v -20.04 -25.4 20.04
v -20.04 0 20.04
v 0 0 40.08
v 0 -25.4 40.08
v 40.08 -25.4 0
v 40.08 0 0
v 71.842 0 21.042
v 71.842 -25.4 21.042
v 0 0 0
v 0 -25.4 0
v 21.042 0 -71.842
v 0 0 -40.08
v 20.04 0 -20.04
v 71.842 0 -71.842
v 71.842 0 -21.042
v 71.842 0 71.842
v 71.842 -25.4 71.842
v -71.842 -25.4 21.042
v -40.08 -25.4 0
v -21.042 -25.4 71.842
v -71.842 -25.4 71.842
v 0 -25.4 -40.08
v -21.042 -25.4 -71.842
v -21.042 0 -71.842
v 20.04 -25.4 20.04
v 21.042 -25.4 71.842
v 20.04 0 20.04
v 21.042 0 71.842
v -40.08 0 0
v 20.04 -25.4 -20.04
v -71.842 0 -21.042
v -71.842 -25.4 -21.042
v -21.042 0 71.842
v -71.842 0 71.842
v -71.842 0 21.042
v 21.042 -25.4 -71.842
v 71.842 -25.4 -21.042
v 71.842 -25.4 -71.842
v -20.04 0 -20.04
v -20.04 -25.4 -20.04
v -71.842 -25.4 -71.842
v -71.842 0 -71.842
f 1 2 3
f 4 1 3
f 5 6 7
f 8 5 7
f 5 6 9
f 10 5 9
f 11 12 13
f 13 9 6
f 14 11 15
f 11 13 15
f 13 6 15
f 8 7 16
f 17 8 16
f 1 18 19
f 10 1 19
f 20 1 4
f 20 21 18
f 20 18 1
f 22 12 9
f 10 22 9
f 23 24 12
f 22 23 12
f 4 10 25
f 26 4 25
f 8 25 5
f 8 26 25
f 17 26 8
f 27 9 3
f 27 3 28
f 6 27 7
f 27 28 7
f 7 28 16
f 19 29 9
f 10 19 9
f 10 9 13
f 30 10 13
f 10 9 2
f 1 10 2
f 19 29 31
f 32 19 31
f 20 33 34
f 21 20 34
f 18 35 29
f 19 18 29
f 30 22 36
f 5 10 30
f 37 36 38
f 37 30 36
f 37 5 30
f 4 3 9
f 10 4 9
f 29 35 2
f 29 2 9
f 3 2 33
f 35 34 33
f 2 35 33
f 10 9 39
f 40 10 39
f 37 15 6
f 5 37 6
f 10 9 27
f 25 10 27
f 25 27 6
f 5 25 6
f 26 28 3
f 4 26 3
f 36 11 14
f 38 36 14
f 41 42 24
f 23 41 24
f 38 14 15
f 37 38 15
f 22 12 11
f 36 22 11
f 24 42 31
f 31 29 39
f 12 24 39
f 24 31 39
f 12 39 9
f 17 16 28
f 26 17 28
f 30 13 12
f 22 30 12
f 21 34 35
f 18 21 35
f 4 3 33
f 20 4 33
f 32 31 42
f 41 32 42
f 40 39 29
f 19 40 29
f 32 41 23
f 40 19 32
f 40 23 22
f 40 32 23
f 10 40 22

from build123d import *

# Parameters (mm, degrees)
F2_DEPTH = 25.4


# Not quite as in the source:
# - a feature of the source that left no trace in its solid (it failed there, or was rolled back) is left out


with BuildPart() as f2:
    # F0 (on Front) → F2 (new body)
    with BuildSketch(Plane.XZ):
        Polygon((0, 40.0797729921), (20.039886496, 20.039886496), (71.8420489686, 71.8420489686), (21.0420489686, 71.8420489686), align=None)
        Polygon((71.8420489686, 71.8420489686), (20.039886496, 20.039886496), (40.0797729921, 0), (71.8420489686, 21.0420489686), align=None)
        Polygon((0, 40.0797729921), (0, 0), (20.039886496, 20.039886496), align=None)
    extrude(amount=F2_DEPTH)


with BuildPart() as f2b:
    # F0 (on Front) → F2, piece 2 (new body)
    with BuildSketch(Plane.XZ):
        Polygon((71.8420489686, -71.8420489686), (20.039886496, -20.039886496), (0, -40.0797729921), (21.0420489686, -71.8420489686), align=None)
        Polygon((40.0797729921, 0), (20.039886496, -20.039886496), (71.8420489686, -71.8420489686), (71.8420489686, -21.0420489686), align=None)
        Polygon((40.0797729921, 0), (0, 0), (20.039886496, -20.039886496), align=None)
    extrude(amount=F2_DEPTH)


with BuildPart() as f2c:
    # F0 (on Front) → F2, piece 3 (new body)
    with BuildSketch(Plane.XZ):
        Polygon((-71.8420489686, -71.8420489686), (-20.039886496, -20.039886496), (-40.0797729921, 0), (-71.8420489686, -21.0420489686), align=None)
        Polygon((0, -40.0797729921), (-20.039886496, -20.039886496), (-71.8420489686, -71.8420489686), (-21.0420489686, -71.8420489686), align=None)
        Polygon((0, -40.0797729921), (0, 0), (-20.039886496, -20.039886496), align=None)
    extrude(amount=F2_DEPTH)


with BuildPart() as f2d:
    # F0 (on Front) → F2, piece 4 (new body)
    with BuildSketch(Plane.XZ):
        Polygon((-71.8420489686, 71.8420489686), (-20.039886496, 20.039886496), (0, 40.0797729921), (-21.0420489686, 71.8420489686), align=None)
        Polygon((-40.0797729921, 0), (-20.039886496, 20.039886496), (-71.8420489686, 71.8420489686), (-71.8420489686, 21.0420489686), align=None)
        Polygon((-40.0797729921, 0), (0, 0), (-20.039886496, 20.039886496), align=None)
    extrude(amount=F2_DEPTH)


solid = Compound([f2.part, f2b.part, f2c.part, f2d.part])
